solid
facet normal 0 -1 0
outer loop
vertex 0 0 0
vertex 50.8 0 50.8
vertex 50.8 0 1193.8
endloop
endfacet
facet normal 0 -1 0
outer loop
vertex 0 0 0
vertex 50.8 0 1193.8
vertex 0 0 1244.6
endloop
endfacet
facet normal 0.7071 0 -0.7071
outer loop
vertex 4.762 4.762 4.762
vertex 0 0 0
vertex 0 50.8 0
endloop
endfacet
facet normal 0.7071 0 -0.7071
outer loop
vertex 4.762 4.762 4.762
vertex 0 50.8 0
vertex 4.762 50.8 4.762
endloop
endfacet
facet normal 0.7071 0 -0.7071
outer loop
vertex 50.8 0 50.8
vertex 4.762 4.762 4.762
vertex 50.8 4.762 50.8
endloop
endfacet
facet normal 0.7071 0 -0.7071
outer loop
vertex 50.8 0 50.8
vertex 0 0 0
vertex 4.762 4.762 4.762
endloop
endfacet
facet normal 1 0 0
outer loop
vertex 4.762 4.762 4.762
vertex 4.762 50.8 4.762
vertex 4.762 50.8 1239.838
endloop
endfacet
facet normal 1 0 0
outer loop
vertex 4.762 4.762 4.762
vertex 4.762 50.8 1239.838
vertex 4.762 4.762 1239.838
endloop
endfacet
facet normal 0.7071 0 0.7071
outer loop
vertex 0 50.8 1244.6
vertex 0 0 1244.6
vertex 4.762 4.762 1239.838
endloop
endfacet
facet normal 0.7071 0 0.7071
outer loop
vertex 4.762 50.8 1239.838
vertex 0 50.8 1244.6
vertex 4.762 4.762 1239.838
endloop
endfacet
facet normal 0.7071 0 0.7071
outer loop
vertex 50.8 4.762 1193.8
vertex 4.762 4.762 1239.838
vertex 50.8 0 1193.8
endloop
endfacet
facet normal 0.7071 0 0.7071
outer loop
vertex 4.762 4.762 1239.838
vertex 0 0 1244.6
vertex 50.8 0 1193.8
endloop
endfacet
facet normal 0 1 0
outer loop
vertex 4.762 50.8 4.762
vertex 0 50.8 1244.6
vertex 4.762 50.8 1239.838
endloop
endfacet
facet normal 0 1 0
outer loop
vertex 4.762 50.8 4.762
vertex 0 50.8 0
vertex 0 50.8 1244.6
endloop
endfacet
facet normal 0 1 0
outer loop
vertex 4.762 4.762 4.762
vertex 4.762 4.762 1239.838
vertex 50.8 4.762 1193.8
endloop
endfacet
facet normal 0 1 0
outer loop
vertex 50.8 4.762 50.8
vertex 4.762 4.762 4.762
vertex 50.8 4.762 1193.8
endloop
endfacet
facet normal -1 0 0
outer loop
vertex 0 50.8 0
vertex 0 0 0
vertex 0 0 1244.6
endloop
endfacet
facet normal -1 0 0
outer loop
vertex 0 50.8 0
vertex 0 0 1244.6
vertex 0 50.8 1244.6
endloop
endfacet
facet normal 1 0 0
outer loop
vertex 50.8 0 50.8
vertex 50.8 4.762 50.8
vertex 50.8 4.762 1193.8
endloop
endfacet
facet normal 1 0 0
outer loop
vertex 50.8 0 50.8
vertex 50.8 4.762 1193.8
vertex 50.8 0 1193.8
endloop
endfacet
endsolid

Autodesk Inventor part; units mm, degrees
ref_plane "YZ Plane" through (0, 0, 0) normal (1, 0, 0) x (0, 1, 0)
ref_plane "XZ Plane" through (0, 0, 0) normal (0, 1, 0) x (-1, 0, 0)
ref_plane "XY Plane" through (0, 0, 0) normal (0, 0, 1) x (1, 0, 0)
sketch "Sketch1" plane through (0, 0, 0) normal (0, 0, 1) x (1, 0, 0)
  line L0 (0, 0) -> (0, 50.8)
  line L1 (0, 50.8) -> (4.7625, 50.8)
  line L2 (4.7625, 50.8) -> (4.7625, 4.7625)
  line L3 (4.7625, 4.7625) -> (50.8, 4.7625)
  line L4 (50.8, 4.7625) -> (50.8, 0)
  line L5 (50.8, 0) -> (0, 0)
  dimension "d0" = 4.7625
  dimension "d1" = 50.8
  dimension "d2" = 4.7625
  dimension "d3" = 50.8
extrude "Extrusion1" add sketch "Sketch1" along normal blind 1244.6
sketch "Sketch5" plane through (0, 0, 0) normal (0, -1, 0) x (1, 0, 0)
  line L0 (50.8, 1244.6) -> (0, 1244.6) projected
  line L1 (50.8, 0) -> (0, 0) projected
  line L2 (50.8, 0) -> (50.8, 1244.6) projected
  line L3 (0, 1244.6) -> (50.8, 1193.8)
  line L4 (0, 0) -> (50.8, 50.8)
  dimension "d16" = 45
  dimension "d17" = 45
extrude "Extrusion5" cut sketch "Sketch5" against normal blind 50.8 contours L2 L3 L0
sketch "Sketch6" plane through (0, 0, 0) normal (0, -1, 0) x (1, 0, 0)
  line L0 (0, 0) -> (0, 1244.6) projected
  line L1 (50.8, 0) -> (0, 0) projected
  line L2 (50.8, 0) -> (50.8, 1193.8) projected
  line L3 (0, 0) -> (50.8, 50.8)
  dimension "d20" = 45
extrude "Extrusion6" cut sketch "Sketch6" against normal blind 50.8
properties part number "BOXC_L49"
